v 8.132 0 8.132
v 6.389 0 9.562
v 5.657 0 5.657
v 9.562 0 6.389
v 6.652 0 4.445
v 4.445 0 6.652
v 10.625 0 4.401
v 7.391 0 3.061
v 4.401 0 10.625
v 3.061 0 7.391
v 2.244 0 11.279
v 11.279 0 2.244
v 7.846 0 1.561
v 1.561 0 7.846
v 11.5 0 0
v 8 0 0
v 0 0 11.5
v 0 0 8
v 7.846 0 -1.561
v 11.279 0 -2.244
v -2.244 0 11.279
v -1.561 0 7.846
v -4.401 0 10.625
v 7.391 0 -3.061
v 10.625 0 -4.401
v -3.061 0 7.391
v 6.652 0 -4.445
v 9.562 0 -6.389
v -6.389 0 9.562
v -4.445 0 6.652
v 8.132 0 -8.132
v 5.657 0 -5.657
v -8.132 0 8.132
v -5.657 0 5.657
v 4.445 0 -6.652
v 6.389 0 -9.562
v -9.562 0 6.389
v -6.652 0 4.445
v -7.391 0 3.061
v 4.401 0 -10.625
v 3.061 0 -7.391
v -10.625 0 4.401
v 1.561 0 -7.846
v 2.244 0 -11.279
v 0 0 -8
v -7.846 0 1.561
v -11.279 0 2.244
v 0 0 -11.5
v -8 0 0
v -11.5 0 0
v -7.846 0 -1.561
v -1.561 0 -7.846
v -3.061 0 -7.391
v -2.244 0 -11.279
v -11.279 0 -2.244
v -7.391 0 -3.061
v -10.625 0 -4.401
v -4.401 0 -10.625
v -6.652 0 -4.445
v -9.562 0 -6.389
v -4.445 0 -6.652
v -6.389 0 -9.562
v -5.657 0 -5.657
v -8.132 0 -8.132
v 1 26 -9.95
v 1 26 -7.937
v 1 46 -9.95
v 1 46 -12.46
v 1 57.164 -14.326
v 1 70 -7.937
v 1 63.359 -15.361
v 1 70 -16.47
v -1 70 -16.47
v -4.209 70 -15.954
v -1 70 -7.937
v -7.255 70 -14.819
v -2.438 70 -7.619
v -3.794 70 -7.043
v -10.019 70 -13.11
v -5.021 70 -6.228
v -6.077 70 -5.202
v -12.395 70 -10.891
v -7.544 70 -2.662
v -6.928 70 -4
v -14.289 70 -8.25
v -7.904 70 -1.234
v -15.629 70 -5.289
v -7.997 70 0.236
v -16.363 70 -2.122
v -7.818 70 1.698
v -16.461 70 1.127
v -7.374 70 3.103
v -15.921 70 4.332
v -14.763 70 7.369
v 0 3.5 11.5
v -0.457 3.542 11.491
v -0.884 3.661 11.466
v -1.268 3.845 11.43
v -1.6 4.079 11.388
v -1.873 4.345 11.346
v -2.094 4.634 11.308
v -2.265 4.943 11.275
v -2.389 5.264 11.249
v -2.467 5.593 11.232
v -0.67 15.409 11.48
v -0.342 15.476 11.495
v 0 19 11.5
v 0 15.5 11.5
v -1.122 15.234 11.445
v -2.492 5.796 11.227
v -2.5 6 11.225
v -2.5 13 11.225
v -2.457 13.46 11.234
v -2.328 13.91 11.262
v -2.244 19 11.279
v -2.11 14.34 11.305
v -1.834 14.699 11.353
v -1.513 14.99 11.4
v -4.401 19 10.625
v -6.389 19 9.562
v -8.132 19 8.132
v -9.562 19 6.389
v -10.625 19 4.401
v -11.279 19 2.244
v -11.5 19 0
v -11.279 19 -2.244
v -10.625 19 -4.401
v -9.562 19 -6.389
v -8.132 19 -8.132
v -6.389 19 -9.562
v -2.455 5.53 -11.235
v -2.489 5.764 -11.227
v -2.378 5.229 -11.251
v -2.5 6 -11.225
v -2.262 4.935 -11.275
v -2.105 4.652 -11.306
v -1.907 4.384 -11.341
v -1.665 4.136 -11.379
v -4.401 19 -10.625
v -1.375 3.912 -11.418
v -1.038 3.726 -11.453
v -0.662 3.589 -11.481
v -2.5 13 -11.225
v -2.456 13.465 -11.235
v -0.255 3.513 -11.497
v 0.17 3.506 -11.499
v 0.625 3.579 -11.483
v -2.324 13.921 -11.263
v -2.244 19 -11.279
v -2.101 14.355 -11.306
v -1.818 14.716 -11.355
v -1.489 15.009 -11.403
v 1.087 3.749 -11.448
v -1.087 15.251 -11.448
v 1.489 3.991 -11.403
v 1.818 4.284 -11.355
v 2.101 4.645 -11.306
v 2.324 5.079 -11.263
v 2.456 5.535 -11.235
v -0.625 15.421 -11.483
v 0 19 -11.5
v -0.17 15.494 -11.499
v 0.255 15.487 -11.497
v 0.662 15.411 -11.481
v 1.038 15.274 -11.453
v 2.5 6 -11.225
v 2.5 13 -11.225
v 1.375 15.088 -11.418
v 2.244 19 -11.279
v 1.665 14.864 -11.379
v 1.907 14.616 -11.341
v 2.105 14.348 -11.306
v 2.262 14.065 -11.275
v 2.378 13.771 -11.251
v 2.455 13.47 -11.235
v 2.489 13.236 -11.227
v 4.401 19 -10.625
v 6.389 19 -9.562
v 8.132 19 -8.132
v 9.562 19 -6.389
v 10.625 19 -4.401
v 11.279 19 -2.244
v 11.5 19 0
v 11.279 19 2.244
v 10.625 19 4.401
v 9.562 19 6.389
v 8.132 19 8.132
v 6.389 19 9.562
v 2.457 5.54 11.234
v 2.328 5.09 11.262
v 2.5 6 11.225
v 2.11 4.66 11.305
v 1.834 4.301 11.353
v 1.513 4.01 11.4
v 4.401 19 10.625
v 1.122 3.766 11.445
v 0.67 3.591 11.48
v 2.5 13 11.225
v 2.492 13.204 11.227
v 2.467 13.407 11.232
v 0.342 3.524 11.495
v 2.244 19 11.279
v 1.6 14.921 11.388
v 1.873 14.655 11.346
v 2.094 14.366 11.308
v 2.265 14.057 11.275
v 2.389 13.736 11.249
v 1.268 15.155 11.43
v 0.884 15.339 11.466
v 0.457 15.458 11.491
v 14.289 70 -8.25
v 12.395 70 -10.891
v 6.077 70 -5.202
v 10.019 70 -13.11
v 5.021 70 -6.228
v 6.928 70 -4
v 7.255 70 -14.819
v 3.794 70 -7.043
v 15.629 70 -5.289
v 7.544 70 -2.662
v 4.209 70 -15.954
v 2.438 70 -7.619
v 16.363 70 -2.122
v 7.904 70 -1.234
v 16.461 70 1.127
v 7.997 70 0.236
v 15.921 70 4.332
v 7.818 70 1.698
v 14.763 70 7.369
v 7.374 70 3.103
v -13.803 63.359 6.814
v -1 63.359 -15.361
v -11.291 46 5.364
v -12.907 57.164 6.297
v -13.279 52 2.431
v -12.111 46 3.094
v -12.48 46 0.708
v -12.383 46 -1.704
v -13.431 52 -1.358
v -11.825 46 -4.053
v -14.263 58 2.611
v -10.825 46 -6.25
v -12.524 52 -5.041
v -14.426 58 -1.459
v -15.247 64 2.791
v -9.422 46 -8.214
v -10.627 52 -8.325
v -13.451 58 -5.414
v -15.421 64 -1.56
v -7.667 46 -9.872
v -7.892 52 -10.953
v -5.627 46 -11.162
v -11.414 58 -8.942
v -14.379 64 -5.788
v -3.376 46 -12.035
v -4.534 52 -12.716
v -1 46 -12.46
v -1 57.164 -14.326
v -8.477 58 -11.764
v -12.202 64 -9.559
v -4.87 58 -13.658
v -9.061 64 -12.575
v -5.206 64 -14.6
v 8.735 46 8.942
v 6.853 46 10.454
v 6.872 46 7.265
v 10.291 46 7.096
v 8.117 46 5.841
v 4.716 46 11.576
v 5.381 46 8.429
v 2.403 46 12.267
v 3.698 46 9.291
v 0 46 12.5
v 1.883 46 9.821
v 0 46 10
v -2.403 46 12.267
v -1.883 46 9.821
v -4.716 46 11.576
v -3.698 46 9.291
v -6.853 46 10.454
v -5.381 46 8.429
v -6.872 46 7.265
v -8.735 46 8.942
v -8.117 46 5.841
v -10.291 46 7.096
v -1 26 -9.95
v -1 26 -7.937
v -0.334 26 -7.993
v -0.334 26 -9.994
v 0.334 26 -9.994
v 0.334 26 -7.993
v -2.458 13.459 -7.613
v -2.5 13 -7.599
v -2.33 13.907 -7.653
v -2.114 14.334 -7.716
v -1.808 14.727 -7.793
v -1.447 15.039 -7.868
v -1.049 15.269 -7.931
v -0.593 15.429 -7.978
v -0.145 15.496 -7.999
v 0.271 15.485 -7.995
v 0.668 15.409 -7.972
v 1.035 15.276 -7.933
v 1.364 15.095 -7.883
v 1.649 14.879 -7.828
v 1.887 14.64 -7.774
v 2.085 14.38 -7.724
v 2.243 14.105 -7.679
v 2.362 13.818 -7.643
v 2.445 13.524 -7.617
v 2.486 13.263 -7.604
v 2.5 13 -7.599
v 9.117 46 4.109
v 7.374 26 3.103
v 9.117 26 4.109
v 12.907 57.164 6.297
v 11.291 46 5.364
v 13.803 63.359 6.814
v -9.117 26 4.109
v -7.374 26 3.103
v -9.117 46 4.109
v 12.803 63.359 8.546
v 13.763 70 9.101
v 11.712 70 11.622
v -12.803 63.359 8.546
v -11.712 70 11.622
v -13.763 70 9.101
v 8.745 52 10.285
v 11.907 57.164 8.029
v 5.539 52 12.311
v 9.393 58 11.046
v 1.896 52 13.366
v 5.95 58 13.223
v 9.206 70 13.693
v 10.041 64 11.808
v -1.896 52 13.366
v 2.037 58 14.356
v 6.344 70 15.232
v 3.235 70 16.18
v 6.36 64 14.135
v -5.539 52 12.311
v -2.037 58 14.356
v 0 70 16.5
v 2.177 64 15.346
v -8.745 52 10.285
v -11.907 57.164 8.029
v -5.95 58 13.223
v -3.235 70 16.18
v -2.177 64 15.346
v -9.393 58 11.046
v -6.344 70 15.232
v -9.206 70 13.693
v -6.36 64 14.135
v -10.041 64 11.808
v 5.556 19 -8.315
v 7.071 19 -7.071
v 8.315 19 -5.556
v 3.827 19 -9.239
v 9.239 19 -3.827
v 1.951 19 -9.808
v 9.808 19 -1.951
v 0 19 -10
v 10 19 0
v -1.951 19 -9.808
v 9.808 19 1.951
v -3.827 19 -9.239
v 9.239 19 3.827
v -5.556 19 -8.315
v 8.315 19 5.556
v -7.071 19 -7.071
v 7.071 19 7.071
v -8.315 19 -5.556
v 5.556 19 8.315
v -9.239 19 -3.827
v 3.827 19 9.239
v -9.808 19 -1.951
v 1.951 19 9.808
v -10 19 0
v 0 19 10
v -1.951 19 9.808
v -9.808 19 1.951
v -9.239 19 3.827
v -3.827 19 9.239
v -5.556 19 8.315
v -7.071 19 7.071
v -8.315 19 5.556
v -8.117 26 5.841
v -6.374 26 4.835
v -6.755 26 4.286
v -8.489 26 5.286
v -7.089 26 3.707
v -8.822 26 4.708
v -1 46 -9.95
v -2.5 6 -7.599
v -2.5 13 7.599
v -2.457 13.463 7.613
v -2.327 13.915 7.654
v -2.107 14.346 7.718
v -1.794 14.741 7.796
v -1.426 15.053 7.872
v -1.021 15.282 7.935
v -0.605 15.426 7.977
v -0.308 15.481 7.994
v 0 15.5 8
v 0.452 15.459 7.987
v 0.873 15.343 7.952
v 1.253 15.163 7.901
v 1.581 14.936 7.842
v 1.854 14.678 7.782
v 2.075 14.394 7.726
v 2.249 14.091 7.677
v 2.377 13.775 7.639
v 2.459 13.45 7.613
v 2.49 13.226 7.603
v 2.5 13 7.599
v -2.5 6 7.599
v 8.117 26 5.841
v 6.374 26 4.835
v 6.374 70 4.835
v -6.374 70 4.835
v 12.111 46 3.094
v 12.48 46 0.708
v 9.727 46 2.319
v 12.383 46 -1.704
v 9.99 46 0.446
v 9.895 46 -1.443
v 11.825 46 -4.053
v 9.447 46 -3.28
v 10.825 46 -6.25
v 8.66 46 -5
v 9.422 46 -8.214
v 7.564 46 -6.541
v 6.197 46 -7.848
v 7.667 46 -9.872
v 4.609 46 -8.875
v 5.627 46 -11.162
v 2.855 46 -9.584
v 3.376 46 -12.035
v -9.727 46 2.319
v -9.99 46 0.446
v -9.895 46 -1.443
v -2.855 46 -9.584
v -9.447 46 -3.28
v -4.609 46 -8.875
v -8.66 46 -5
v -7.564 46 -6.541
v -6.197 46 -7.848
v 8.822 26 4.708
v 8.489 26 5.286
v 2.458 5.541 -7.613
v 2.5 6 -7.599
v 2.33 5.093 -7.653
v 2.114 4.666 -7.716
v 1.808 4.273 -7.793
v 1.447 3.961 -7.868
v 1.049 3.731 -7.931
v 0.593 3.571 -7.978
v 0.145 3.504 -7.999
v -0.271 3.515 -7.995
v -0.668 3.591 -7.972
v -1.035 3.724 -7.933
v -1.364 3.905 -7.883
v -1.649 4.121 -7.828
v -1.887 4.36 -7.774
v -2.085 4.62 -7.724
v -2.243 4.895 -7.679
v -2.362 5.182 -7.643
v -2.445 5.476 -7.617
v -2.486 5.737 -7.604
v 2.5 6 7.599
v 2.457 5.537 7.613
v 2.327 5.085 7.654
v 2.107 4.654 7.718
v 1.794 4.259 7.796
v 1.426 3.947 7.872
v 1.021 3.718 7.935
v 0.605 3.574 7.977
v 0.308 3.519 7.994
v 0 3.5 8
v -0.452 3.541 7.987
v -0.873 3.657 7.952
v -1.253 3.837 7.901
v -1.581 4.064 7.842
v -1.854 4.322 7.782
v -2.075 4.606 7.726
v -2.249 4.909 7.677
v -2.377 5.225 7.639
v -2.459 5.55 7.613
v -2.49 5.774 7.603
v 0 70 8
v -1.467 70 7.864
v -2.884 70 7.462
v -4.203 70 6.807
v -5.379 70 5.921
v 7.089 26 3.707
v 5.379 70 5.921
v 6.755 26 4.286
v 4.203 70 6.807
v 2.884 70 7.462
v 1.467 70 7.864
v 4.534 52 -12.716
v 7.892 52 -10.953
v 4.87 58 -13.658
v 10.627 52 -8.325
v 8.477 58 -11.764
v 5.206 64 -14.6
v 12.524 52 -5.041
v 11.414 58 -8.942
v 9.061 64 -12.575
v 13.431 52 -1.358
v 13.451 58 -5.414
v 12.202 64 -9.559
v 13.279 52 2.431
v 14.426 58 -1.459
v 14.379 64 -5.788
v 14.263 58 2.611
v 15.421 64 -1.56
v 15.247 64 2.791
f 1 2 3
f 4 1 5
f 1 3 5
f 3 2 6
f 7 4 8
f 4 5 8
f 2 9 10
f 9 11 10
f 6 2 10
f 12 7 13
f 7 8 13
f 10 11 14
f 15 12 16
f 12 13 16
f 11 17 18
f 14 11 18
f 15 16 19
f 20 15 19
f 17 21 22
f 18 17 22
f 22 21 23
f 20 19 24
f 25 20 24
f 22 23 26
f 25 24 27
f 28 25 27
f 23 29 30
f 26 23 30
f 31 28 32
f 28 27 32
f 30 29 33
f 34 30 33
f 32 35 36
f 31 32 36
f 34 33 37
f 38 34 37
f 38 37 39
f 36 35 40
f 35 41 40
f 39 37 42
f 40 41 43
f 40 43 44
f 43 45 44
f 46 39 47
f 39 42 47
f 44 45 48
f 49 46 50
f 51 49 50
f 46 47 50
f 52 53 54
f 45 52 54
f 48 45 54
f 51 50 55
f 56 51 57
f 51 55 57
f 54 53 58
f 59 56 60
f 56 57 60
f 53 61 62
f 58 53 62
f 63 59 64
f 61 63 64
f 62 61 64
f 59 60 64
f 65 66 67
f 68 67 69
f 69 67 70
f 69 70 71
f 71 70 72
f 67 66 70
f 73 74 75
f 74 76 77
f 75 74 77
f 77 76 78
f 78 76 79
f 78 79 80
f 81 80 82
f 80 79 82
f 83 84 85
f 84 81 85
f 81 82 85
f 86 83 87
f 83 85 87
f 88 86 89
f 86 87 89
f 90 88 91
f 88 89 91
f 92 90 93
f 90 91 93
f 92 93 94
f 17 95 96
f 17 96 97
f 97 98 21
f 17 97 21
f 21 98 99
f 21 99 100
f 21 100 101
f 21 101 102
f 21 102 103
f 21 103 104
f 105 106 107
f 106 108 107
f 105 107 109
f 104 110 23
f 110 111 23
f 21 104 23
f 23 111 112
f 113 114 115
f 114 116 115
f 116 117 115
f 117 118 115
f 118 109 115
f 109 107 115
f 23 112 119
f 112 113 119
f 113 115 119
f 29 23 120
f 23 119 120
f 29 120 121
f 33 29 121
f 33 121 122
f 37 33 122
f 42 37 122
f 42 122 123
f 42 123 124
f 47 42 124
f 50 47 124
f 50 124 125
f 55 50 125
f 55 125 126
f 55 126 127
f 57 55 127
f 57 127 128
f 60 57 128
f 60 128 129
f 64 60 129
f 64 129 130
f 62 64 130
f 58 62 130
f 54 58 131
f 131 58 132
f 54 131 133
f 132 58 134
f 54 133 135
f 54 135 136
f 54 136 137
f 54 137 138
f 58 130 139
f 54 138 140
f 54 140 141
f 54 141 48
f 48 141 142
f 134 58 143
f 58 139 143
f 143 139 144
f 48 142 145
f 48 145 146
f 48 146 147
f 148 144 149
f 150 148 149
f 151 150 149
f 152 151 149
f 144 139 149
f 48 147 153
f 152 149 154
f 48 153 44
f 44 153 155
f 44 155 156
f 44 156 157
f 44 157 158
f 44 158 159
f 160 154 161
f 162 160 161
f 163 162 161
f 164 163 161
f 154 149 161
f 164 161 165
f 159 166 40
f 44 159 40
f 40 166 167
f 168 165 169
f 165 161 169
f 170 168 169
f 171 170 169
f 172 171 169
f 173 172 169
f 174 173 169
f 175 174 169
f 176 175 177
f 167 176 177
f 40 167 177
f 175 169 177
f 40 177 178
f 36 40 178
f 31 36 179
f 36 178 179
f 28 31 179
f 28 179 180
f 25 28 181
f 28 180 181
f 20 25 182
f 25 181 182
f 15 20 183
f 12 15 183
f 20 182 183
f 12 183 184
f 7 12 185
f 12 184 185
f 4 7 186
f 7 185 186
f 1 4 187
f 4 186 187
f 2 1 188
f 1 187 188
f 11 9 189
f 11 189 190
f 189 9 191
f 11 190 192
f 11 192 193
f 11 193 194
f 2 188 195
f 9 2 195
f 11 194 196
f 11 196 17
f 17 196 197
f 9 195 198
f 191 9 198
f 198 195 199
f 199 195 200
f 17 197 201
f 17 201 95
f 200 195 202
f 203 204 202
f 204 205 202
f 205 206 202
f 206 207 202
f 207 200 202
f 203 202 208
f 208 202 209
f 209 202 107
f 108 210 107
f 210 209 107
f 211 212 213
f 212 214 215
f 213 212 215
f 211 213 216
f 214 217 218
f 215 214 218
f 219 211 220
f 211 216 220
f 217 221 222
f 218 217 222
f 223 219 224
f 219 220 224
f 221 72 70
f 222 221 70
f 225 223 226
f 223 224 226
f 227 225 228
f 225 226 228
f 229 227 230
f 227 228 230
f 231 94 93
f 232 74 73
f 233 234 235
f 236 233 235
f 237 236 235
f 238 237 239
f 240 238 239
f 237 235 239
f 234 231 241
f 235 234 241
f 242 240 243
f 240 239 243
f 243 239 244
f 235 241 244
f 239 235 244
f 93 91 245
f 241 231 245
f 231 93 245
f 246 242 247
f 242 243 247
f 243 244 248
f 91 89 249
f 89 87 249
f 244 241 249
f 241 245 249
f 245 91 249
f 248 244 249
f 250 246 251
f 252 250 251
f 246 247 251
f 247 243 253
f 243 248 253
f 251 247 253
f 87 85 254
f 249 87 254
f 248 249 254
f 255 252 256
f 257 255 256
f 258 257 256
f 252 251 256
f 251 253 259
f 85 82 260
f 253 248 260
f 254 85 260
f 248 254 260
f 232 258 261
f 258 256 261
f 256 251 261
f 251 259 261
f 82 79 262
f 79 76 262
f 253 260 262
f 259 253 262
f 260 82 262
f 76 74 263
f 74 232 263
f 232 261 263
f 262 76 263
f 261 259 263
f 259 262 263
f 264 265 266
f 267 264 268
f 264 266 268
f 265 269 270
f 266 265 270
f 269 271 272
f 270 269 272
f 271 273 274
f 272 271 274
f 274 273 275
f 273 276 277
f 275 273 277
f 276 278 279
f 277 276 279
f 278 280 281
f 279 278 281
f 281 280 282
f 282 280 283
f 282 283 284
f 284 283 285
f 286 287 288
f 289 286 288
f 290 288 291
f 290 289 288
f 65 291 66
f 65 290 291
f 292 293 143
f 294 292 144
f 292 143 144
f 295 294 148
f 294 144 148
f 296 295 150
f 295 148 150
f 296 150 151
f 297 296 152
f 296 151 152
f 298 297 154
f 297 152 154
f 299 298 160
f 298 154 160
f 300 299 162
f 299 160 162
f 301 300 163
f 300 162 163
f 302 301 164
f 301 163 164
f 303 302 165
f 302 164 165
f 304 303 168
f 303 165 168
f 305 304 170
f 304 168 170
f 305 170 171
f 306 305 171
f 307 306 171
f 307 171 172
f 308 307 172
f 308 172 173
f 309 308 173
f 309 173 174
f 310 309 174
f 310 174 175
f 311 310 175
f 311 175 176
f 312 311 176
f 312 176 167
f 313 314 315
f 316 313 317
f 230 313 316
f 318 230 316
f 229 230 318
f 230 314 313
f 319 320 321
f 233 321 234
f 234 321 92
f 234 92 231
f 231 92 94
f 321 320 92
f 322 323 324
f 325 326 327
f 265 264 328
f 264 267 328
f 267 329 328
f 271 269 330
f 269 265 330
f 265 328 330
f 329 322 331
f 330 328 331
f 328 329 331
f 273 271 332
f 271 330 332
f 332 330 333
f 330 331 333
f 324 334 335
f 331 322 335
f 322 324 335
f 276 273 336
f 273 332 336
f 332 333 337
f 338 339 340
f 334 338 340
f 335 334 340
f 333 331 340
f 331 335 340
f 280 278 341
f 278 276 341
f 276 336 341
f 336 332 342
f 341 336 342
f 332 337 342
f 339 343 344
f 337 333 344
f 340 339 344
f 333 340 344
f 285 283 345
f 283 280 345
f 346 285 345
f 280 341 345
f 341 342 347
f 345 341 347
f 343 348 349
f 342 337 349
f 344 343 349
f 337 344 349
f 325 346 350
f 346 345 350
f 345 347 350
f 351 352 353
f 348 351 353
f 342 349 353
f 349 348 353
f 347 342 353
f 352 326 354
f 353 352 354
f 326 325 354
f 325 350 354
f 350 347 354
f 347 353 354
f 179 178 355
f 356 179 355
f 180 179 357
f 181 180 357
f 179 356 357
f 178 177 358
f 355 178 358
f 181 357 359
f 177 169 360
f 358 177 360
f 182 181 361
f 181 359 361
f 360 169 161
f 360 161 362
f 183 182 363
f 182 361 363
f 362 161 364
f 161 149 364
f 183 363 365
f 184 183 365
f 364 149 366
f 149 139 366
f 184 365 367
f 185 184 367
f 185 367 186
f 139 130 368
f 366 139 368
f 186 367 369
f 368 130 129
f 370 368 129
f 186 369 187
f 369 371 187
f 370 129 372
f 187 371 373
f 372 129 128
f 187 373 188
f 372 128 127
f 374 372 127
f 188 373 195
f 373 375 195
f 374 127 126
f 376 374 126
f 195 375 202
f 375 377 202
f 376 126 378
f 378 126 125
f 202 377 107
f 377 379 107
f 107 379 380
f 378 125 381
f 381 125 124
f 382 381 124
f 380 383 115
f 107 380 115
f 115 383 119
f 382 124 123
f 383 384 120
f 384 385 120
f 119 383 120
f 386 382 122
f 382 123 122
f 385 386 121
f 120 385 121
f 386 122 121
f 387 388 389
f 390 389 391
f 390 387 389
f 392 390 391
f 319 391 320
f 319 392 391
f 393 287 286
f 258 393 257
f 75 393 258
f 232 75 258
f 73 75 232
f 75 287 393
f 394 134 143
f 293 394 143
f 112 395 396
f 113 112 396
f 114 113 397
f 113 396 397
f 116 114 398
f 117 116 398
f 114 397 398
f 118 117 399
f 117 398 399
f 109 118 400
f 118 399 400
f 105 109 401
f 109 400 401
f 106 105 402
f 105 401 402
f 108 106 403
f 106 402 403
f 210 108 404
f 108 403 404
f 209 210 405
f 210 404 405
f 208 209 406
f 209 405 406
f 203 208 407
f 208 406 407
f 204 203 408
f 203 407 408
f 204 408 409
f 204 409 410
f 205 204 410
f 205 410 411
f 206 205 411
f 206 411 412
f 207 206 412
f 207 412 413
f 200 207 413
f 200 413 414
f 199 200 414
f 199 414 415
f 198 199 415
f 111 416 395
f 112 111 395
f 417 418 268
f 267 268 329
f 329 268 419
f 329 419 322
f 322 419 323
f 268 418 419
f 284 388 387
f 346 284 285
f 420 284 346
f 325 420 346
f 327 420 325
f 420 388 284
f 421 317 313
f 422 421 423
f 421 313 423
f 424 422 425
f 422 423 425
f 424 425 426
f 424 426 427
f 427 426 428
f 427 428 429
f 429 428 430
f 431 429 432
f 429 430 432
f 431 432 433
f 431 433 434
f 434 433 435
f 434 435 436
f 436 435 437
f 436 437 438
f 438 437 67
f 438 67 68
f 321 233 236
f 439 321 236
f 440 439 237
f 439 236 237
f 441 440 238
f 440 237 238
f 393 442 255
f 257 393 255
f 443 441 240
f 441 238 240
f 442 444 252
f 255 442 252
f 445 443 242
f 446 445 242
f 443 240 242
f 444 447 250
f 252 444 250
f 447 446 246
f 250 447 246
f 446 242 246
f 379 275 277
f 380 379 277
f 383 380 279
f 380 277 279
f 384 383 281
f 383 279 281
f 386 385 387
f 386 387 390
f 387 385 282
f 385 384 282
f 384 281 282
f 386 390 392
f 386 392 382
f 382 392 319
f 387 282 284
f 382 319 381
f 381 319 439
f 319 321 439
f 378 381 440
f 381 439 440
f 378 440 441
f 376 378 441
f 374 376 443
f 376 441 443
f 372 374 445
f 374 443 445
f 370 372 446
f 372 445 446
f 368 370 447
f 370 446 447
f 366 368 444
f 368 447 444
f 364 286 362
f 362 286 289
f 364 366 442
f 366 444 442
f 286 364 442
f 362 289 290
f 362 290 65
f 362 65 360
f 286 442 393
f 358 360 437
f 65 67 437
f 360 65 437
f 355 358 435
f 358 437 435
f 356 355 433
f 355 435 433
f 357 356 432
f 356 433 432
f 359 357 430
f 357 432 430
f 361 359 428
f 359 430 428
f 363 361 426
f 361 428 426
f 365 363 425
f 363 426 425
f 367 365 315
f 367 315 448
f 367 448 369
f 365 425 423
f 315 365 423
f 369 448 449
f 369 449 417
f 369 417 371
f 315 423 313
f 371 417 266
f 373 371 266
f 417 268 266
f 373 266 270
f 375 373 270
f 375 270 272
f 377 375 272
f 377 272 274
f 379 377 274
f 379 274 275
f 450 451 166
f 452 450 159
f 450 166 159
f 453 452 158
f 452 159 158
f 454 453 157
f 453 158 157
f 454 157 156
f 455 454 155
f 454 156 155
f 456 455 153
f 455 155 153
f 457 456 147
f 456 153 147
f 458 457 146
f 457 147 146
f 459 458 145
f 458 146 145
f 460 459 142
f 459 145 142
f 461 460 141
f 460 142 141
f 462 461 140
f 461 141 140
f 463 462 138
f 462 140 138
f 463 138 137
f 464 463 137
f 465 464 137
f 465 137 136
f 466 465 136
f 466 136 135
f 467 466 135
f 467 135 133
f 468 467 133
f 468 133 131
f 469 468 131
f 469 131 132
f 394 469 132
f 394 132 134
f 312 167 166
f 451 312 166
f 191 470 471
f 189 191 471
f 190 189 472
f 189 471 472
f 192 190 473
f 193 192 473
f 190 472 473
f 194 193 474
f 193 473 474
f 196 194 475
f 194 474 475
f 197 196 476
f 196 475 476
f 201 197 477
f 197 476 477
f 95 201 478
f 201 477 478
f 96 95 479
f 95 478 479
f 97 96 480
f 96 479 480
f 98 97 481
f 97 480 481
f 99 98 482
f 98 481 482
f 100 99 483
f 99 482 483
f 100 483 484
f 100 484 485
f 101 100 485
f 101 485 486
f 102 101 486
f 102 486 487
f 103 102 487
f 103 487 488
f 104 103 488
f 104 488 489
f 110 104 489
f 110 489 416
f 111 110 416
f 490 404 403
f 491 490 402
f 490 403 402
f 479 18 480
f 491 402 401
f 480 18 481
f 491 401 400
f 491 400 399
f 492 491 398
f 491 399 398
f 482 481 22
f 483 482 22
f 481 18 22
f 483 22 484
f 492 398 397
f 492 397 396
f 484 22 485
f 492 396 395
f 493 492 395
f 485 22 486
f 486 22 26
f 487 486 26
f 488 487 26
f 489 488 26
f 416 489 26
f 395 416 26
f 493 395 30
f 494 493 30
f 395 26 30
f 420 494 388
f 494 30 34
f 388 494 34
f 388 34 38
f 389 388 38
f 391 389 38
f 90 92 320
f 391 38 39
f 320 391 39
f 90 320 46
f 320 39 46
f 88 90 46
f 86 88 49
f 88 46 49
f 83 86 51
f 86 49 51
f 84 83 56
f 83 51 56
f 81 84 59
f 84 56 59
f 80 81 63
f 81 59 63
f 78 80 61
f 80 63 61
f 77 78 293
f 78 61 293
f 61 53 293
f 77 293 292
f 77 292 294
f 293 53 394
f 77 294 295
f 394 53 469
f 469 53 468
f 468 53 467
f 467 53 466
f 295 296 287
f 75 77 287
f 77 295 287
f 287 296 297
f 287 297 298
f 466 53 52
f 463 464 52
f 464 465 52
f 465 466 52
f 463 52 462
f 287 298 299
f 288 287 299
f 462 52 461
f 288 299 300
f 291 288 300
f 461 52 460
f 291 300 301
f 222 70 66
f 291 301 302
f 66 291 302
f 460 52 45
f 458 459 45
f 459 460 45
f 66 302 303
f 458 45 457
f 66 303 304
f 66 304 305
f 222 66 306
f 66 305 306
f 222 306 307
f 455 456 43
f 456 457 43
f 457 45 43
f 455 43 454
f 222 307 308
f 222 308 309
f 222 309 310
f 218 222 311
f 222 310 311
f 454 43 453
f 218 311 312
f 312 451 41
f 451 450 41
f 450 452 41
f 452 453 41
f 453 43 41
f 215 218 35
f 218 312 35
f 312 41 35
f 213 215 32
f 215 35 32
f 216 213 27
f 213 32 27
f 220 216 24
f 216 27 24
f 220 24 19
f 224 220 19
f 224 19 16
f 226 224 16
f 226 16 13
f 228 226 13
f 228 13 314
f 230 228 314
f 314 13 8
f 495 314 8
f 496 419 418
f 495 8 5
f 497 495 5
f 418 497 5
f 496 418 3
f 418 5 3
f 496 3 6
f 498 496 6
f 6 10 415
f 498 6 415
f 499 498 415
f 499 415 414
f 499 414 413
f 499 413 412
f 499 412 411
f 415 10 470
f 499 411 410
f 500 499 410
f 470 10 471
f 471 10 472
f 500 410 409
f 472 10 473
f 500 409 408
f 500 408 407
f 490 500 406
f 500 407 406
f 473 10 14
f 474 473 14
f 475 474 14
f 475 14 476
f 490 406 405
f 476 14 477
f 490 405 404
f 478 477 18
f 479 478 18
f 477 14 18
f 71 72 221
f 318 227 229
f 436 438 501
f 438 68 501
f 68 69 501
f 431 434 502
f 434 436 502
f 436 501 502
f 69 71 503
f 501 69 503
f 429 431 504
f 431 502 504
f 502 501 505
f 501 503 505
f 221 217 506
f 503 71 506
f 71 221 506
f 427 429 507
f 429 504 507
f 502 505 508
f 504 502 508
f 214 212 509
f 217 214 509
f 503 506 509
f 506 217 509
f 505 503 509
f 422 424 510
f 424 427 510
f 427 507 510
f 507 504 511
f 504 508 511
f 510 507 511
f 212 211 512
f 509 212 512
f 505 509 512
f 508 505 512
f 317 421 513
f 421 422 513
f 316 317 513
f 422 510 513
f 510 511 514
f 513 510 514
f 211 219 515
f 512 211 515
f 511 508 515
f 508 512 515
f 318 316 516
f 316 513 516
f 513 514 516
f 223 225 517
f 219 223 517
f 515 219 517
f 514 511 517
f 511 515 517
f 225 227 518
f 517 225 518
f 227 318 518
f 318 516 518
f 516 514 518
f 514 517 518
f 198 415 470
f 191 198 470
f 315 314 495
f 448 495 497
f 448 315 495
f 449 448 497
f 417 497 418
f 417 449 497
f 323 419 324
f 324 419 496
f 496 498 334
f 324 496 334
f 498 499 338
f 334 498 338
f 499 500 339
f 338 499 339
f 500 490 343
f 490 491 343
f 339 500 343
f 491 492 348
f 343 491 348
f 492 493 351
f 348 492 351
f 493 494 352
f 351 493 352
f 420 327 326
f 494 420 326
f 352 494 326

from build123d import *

# Parameters (mm, degrees)
CUT_EXTRUDE1_DEPTH      = 74.786855198
CUT_EXTRUDE1_DEPTH_BACK = 74.786855198
SKETCH3_W               = 2
SKETCH3_H               = 17
CUT_EXTRUDE2_DEPTH      = 44
CIRPATTERN1_COUNT       = 3


with BuildPart() as part:
    # Sketch1 → Revolve1 (revolve)
    with BuildSketch(Plane.XY, mode=Mode.PRIVATE) as revolve1_sk:
        Polygon((8, 0), (11.5, 0), (11.5, 19), (10, 19), (10, 46), (12.5, 46), (16.5, 70), (8, 70), align=None)
    revolve(revolve1_sk.sketch.rotate(Axis((0, 72.635796235, 0), (0, -1, 0)), 90), axis=Axis((0, 72.635796235, 0), (0, -1, 0)))

    # Sketch2 → Cut-Extrude1 (cut, two sides: drawn at the far end of the back side and taken through both)
    with BuildSketch(Plane.XY.offset(-CUT_EXTRUDE1_DEPTH_BACK)):
        with BuildLine():
            Line((2.5, 13), (2.5, 6))
            ThreePointArc((2.5, 6), (0, 3.5), (-2.5, 6))
            Line((-2.5, 6), (-2.5, 13))
            ThreePointArc((-2.5, 13), (0, 15.5), (2.5, 13))
        make_face()
    extrude(amount=CUT_EXTRUDE1_DEPTH + CUT_EXTRUDE1_DEPTH_BACK, mode=Mode.SUBTRACT)

    # Sketch3 → Cut-Extrude2 (cut)
    with BuildSketch(Plane(origin=(0, 70, 0), x_dir=(1, 0, 0), z_dir=(0, 1, 0))):
        with Locations((0, 13.67175851)):
            Rectangle(SKETCH3_W, SKETCH3_H)
    cut_extrude2 = extrude(amount=-CUT_EXTRUDE2_DEPTH, mode=Mode.SUBTRACT)

    # CirPattern1: Cut-Extrude2 ×3 about axis
    cirpattern1_axis = Axis((0, 0, 0), (0, 1, 0))
    for i in range(1, CIRPATTERN1_COUNT):
        add(cut_extrude2.rotate(cirpattern1_axis, i * 360 / CIRPATTERN1_COUNT), mode=Mode.SUBTRACT)


solid = part.part
